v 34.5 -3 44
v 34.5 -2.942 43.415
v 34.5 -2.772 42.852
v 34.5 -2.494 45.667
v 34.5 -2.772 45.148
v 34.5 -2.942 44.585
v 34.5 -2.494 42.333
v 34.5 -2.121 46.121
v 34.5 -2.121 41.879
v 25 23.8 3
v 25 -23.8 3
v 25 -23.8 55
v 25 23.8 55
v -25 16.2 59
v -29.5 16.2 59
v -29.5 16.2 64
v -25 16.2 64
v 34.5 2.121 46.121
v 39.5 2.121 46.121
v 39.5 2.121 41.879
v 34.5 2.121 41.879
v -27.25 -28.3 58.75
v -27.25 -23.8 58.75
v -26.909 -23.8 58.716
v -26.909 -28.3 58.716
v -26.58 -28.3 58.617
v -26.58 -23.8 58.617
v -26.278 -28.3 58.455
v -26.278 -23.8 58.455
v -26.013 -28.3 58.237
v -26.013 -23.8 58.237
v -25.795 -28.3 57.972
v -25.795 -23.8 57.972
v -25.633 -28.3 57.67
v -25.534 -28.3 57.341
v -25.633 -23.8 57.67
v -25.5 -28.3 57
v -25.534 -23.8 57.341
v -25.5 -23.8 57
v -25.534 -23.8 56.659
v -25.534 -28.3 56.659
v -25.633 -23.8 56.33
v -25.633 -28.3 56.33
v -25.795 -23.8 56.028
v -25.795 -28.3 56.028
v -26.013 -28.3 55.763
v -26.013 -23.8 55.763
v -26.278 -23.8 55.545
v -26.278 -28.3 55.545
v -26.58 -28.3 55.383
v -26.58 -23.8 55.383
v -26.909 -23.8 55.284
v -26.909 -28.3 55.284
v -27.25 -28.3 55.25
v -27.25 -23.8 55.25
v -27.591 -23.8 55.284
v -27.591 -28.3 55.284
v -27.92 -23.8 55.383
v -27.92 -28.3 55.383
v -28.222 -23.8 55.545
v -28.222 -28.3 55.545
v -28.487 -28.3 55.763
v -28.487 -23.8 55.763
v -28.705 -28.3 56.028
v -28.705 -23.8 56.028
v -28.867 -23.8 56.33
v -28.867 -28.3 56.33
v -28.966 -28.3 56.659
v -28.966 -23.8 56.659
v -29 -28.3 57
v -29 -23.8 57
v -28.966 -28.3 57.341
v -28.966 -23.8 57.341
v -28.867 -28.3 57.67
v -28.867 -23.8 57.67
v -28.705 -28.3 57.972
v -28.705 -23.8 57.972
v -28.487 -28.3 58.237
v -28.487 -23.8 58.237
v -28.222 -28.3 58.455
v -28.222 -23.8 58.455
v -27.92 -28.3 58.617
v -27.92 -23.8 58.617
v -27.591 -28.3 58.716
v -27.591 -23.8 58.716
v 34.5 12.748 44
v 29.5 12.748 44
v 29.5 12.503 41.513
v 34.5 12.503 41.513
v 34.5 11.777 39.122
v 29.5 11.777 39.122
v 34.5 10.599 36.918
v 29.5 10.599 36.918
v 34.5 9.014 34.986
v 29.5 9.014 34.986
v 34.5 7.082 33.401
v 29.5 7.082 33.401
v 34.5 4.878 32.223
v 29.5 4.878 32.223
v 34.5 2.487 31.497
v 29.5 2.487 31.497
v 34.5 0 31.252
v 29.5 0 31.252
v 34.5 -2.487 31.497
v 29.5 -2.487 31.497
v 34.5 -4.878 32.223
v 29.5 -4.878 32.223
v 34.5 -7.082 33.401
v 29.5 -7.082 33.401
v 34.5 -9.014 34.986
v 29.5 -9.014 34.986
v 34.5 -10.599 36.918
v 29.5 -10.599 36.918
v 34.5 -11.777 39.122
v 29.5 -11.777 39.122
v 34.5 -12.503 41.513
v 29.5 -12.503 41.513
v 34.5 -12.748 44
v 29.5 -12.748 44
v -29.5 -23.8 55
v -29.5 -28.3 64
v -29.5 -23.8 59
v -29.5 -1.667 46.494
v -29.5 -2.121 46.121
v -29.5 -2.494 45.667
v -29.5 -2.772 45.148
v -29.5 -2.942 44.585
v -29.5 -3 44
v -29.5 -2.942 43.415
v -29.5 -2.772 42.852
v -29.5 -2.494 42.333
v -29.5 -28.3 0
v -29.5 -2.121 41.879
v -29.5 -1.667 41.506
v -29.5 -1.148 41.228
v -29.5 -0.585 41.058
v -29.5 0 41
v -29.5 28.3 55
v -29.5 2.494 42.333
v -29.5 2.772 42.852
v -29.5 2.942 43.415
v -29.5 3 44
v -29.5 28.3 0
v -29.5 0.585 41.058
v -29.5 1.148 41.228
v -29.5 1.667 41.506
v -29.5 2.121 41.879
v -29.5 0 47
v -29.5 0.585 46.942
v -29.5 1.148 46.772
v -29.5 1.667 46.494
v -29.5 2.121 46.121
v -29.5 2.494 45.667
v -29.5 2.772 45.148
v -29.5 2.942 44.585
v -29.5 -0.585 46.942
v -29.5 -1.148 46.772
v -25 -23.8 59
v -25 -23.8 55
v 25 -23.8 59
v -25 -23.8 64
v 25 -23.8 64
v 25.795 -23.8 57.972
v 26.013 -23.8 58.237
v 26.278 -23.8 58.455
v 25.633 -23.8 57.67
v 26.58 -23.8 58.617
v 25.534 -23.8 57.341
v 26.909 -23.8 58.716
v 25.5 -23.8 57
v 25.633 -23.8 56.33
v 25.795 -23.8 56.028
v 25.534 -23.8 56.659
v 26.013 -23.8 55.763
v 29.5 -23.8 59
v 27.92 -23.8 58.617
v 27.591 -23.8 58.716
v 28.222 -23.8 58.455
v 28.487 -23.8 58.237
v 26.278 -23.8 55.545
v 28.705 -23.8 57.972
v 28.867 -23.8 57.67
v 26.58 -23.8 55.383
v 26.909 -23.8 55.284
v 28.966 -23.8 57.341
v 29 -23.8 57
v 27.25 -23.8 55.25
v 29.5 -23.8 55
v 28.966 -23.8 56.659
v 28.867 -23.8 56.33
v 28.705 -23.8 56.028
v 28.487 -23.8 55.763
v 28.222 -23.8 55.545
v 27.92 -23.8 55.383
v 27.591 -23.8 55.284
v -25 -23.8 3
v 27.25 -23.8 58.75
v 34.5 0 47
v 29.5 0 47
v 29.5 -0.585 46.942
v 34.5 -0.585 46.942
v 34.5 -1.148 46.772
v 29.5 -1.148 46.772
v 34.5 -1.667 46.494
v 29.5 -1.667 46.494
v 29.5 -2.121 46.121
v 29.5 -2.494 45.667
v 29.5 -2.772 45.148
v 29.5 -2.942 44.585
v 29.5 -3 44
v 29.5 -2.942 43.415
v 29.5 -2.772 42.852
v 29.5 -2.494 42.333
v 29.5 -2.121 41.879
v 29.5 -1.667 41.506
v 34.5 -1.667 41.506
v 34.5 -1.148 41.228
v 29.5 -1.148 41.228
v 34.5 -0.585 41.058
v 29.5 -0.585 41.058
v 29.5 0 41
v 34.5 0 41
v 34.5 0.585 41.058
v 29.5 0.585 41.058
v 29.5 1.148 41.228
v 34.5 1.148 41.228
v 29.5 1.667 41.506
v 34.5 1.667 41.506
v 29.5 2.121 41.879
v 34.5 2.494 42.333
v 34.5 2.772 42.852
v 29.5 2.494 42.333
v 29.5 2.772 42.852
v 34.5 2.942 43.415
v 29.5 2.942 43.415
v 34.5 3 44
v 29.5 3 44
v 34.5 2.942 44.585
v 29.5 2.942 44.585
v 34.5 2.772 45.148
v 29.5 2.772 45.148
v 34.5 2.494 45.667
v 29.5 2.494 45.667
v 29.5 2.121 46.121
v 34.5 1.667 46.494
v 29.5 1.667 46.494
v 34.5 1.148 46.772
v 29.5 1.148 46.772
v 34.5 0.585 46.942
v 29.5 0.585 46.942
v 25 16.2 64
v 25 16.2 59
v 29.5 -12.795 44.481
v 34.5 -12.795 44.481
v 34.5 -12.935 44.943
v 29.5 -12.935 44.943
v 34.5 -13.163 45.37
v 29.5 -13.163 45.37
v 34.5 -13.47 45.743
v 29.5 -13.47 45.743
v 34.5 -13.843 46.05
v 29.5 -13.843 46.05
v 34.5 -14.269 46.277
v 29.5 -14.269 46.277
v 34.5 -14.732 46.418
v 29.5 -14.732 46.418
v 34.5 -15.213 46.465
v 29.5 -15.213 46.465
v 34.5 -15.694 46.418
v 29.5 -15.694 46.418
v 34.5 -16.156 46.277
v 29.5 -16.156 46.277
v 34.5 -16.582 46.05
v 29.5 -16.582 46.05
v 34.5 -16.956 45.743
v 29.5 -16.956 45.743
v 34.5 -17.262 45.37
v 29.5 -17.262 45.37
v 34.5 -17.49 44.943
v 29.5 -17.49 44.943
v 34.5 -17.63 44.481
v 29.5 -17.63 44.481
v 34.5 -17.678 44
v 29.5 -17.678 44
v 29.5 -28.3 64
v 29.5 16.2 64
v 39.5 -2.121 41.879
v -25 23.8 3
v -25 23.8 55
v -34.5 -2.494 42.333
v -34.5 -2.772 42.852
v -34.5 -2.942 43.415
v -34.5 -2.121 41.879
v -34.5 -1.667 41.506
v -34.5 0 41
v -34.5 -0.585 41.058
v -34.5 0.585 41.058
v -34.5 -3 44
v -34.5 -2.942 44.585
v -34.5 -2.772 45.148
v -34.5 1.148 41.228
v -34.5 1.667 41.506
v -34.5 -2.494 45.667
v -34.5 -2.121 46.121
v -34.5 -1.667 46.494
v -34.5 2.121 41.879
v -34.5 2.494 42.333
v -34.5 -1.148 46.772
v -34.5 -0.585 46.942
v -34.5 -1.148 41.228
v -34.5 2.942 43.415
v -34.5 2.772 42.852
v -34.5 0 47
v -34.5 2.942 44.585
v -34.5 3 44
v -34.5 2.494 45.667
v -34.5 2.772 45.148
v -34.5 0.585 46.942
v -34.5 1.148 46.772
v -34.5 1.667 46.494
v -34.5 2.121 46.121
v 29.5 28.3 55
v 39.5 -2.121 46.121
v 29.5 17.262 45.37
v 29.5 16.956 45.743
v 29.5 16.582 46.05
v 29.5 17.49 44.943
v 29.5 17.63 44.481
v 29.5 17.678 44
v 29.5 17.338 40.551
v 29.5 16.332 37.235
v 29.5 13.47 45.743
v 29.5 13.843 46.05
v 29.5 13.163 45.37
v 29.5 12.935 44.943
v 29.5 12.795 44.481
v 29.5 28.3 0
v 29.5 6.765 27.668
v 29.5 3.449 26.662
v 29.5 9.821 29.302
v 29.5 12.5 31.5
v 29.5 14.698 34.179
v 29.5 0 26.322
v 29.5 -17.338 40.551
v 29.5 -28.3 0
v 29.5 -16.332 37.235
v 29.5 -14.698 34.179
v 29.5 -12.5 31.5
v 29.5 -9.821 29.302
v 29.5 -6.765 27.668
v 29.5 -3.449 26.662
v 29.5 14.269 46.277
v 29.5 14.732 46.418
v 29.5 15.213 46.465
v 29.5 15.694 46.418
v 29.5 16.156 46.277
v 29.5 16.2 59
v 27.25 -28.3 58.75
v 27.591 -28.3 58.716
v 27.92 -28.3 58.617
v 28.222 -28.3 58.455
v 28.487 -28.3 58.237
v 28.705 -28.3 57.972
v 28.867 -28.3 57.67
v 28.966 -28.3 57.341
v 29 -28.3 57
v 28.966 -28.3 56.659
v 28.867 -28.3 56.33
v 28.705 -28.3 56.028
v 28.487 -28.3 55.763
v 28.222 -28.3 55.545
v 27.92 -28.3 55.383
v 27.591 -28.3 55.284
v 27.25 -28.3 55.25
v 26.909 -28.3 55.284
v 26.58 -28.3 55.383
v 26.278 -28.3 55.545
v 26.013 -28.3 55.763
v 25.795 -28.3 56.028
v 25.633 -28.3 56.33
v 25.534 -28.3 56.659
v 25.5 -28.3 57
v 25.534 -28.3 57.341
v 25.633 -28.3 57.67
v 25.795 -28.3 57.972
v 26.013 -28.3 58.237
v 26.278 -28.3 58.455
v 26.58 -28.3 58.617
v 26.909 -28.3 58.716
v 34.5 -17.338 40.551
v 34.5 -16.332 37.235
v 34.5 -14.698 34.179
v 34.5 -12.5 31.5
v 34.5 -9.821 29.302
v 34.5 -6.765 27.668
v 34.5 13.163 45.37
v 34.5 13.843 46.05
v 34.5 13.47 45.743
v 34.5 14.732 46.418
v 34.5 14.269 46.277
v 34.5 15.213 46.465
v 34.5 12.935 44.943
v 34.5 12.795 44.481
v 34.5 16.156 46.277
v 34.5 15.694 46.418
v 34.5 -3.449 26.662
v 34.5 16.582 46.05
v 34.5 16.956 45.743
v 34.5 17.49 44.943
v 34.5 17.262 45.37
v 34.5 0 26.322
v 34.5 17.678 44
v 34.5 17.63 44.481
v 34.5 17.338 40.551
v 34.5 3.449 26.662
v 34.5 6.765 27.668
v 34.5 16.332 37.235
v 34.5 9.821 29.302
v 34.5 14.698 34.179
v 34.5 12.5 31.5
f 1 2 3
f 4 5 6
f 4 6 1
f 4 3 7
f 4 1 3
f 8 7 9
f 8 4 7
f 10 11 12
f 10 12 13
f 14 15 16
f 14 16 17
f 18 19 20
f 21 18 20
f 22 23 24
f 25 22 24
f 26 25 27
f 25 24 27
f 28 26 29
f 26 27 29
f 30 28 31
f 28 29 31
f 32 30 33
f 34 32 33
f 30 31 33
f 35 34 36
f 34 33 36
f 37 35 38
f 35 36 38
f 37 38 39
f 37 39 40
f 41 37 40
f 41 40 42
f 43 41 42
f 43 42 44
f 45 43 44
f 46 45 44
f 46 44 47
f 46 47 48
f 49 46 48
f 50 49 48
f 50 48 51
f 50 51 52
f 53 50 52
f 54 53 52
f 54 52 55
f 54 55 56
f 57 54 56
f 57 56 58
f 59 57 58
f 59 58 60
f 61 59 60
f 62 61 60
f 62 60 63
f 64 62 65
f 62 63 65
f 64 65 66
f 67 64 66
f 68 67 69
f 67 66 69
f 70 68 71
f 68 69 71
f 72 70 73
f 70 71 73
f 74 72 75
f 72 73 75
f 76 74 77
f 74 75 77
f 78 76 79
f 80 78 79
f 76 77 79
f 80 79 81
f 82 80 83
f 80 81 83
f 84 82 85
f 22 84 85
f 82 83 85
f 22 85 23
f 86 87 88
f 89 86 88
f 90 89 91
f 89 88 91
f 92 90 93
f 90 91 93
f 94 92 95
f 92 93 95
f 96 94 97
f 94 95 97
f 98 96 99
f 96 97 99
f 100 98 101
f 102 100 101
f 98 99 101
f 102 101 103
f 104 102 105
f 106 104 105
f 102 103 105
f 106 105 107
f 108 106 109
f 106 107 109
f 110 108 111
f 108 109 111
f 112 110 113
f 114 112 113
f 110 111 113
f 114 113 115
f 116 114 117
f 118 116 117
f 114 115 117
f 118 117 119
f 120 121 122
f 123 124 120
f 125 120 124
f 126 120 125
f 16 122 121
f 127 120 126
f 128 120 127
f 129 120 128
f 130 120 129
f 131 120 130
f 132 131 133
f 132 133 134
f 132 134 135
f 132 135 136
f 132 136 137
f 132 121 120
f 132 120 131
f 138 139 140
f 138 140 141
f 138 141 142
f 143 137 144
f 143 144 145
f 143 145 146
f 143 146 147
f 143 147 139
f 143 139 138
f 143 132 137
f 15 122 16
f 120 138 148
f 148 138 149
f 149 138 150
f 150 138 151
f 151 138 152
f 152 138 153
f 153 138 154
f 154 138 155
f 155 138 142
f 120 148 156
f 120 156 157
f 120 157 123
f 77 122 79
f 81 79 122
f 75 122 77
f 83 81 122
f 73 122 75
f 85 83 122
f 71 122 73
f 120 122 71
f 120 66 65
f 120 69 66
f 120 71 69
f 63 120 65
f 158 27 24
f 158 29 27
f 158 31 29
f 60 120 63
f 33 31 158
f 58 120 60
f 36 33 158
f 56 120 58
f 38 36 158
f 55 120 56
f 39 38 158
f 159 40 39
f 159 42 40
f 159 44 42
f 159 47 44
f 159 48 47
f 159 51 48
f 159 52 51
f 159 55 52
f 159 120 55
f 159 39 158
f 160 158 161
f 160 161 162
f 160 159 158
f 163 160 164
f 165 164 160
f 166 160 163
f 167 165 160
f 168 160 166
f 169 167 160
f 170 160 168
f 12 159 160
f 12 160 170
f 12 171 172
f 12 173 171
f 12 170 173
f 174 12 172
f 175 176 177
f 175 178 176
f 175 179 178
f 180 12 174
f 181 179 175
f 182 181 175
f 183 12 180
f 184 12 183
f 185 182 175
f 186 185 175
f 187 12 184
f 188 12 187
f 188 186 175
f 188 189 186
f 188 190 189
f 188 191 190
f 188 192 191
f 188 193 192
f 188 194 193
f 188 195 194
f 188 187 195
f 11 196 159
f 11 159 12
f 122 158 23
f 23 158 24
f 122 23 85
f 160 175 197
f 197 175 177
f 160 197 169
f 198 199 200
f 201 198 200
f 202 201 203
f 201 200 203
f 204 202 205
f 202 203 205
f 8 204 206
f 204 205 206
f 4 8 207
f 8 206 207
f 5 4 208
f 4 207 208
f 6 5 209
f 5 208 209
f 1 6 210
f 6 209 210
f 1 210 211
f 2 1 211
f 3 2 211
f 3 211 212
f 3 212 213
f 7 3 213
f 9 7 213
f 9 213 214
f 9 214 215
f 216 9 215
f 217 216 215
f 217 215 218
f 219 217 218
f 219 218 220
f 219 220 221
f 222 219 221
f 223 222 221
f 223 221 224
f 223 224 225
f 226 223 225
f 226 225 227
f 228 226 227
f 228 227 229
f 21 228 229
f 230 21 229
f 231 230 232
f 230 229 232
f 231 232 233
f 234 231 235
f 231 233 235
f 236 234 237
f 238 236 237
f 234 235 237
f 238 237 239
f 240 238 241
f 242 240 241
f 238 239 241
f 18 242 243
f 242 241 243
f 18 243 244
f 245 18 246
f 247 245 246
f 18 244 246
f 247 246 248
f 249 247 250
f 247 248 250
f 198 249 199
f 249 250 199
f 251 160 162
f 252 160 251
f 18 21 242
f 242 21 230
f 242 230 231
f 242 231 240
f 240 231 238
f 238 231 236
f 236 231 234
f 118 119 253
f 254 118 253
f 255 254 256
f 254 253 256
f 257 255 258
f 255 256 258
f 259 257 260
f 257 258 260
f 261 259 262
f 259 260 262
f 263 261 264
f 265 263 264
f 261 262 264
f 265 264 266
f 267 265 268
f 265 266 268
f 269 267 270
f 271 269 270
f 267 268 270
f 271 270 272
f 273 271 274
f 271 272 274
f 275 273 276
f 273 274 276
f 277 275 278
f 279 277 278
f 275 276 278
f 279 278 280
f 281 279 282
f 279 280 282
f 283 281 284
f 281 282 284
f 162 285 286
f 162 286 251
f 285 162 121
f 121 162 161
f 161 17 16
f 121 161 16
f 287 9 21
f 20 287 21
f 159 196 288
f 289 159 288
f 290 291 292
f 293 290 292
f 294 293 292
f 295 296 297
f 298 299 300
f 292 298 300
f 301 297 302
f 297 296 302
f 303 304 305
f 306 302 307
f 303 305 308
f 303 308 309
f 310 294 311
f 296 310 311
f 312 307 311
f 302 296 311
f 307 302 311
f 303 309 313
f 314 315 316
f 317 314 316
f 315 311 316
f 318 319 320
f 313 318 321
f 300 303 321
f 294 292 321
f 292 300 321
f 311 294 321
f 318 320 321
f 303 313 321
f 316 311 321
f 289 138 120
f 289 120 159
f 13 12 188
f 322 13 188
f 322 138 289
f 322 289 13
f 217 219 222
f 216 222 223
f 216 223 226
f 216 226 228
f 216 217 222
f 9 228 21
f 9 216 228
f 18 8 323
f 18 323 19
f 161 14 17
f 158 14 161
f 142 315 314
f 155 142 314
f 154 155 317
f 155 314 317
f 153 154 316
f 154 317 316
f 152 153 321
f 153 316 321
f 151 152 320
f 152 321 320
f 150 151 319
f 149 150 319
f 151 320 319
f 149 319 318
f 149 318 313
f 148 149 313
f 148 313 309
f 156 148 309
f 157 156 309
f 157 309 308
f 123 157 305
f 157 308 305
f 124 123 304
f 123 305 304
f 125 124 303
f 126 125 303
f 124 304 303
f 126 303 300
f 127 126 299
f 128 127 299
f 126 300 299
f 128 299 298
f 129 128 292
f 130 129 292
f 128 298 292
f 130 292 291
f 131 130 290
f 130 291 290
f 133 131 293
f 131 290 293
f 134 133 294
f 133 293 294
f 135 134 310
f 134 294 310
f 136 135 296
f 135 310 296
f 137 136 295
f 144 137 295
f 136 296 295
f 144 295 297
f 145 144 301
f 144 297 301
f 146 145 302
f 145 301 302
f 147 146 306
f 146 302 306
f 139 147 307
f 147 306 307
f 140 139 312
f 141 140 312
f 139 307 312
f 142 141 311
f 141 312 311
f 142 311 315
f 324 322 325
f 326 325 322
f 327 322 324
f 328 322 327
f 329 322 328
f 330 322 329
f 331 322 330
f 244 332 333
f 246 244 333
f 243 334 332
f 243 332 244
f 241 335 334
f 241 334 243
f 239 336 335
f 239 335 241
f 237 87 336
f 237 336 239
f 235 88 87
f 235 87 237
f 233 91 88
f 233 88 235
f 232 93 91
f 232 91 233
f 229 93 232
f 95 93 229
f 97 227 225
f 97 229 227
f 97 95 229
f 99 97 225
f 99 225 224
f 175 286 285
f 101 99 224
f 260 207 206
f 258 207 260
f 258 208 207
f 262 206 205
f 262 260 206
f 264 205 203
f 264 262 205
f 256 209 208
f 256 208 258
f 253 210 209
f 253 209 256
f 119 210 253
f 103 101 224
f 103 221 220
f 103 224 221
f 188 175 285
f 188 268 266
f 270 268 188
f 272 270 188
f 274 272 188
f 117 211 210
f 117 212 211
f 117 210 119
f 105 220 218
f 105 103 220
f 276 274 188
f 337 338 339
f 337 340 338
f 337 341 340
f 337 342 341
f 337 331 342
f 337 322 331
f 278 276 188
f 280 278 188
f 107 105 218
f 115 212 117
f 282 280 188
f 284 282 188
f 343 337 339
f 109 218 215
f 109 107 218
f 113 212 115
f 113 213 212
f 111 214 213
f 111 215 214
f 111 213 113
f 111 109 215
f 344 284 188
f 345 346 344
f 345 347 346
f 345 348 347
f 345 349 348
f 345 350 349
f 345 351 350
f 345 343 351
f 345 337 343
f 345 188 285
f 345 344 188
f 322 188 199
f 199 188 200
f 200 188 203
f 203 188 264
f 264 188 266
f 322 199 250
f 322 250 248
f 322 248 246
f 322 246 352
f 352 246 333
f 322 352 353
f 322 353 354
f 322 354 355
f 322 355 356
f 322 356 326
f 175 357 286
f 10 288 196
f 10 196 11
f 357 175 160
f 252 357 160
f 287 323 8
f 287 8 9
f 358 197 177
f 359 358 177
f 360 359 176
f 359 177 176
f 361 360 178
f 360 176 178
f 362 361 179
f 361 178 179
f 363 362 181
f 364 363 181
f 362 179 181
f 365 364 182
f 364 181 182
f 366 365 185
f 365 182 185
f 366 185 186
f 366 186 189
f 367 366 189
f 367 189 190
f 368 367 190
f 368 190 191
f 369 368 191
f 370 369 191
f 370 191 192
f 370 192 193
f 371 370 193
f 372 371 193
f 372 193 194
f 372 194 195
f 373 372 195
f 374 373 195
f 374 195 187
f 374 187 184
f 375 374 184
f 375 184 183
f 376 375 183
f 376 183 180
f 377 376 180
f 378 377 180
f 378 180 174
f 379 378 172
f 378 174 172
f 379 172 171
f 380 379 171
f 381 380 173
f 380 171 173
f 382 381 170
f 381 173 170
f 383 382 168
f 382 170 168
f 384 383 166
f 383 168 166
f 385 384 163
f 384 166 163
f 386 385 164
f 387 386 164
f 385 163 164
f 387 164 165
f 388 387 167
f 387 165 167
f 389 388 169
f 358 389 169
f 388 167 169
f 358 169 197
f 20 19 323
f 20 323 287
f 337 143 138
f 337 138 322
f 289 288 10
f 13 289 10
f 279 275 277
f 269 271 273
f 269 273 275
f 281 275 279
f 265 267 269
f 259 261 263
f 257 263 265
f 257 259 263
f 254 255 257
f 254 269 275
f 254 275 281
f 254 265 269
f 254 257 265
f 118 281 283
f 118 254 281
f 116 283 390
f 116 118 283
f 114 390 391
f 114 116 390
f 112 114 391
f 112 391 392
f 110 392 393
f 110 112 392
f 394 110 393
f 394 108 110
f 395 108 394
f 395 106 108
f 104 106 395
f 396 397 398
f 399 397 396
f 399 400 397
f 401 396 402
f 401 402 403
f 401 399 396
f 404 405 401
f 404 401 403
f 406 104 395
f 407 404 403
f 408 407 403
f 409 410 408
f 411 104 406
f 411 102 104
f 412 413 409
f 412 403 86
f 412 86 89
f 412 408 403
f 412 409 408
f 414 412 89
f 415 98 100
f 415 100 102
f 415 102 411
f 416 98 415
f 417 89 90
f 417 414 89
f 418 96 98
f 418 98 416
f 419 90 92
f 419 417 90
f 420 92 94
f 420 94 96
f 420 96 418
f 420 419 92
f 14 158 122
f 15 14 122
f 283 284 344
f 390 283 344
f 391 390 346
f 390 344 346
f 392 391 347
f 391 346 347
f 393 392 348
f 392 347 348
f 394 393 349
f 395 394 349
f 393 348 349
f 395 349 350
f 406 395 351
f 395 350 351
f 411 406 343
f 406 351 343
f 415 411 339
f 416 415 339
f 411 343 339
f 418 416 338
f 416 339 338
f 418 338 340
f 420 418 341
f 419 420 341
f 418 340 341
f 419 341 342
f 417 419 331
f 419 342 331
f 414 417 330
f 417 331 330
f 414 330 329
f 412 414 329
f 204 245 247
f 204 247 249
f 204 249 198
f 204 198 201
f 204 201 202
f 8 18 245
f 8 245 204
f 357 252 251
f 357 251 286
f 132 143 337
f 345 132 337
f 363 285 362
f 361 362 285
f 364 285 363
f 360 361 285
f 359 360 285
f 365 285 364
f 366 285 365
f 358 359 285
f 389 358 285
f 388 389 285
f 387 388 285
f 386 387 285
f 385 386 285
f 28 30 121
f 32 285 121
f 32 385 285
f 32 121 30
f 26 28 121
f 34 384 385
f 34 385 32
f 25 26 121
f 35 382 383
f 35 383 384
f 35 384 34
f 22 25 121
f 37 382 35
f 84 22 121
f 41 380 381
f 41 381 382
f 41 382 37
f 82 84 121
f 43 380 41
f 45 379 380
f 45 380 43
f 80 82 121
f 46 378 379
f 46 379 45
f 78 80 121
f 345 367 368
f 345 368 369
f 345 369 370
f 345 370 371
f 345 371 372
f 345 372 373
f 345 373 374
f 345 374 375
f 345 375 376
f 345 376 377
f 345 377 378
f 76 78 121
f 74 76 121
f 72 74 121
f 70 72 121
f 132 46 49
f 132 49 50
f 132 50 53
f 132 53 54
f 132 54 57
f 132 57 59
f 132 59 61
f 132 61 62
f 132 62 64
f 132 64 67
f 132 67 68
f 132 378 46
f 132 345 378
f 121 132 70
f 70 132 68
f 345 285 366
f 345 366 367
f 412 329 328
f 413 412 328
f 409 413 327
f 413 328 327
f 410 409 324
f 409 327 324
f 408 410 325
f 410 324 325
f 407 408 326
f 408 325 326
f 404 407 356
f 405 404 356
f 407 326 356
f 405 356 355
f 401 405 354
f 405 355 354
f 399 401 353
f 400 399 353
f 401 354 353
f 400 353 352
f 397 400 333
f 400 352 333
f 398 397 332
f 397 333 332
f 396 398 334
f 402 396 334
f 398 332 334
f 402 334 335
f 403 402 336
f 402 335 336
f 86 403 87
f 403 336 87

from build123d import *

# Parameters (mm, degrees)
SKETCH1_W           = 59
SKETCH1_H           = 56.6
SKETCH1_W_2         = 50
SKETCH1_H_2         = 47.6
BOSS_EXTRUDE1_DEPTH = 3
BOSS_EXTRUDE2_START = 3
SKETCH1_3_W         = 59
SKETCH1_3_H         = 56.6
SKETCH1_3_W_2       = 50
SKETCH1_3_H_2       = 47.6
BOSS_EXTRUDE2_DEPTH = 52
SKETCH2_W           = 59
SKETCH2_H           = 4.5
BOSS_EXTRUDE3_DEPTH = 4
BOSS_EXTRUDE4_DEPTH = 5
SKETCH4_R           = 1.75
CUT_EXTRUDE1_DEPTH  = 88.639374713
SKETCH5_R           = 3
BOSS_EXTRUDE5_DEPTH = 5
MIRROR1_START       = -34.5
MIRROR1_OUTLINE_R   = 3
MIRROR1_DEPTH       = 5
SKETCH6_W           = 4.242640688
SKETCH6_H           = 4.242640688
BOSS_EXTRUDE6_DEPTH = 5


# Read off the part's stored shape, not the designer's step: Mirror1
with BuildPart() as part:
    # Sketch1 → Boss-Extrude1 (new body)
    # profile 1 of 2: a face of its own
    with BuildSketch(Plane.XY):
        Rectangle(SKETCH1_W, SKETCH1_H)
        Rectangle(SKETCH1_W_2, SKETCH1_H_2, mode=Mode.SUBTRACT)
    # profile 2 of 2: a face of its own
    with BuildSketch(Plane.XY):
        Rectangle(SKETCH1_W_2, SKETCH1_H_2)
    extrude(amount=BOSS_EXTRUDE1_DEPTH)

    # Sketch1<3> → Boss-Extrude2 (add)
    with BuildSketch(Plane.XY.offset(BOSS_EXTRUDE2_START)):
        Rectangle(SKETCH1_3_W, SKETCH1_3_H)
        Rectangle(SKETCH1_3_W_2, SKETCH1_3_H_2, mode=Mode.SUBTRACT)
    extrude(amount=BOSS_EXTRUDE2_DEPTH)

    # Sketch2 → Boss-Extrude3 (add)
    with BuildSketch(Plane.XY.offset(55)):
        with Locations((0, -26.05)):
            Rectangle(SKETCH2_W, SKETCH2_H)
    extrude(amount=BOSS_EXTRUDE3_DEPTH)

    # Sketch3 → Boss-Extrude4 (add)
    with BuildSketch(Plane.XY.offset(59)):
        Polygon((-29.5, -28.3), (-29.5, 16.2), (-25, 16.2), (-25, -23.8), (25, -23.8), (25, 16.2), (29.5, 16.2), (29.5, -28.3), align=None)
    extrude(amount=BOSS_EXTRUDE4_DEPTH)

    # Sketch4 → Cut-Extrude1 (cut, through all)
    with BuildSketch(Plane(origin=(0, -23.8, 0), x_dir=(1, 0, 0), z_dir=(0, 1, 0))):
        with Locations(Location((-27.25, -57, 0), (0, 0, 270))):
            Circle(SKETCH4_R)
        with Locations(Location((27.25, -57, 0), (0, 0, 270))):
            Circle(SKETCH4_R)
    extrude(amount=-CUT_EXTRUDE1_DEPTH, mode=Mode.SUBTRACT)

    # Sketch5 → Boss-Extrude5 (add)
    with BuildSketch(Plane(origin=(29.5, 0, 0), x_dir=(0, 0, -1), z_dir=(1, 0, 0))):
        with Locations(Location((-44, 0, 0), (0, 0, 180))):
            Circle(SKETCH5_R)
        with BuildLine():
            ThreePointArc((-44, -17.67766953), (-26.32233047, 0), (-44, 17.67766953))
            ThreePointArc((-44, 17.67766953), (-46.465060373, 15.212609157), (-44, 12.747548784))
            ThreePointArc((-44, 12.747548784), (-31.252451216, 0), (-44, -12.747548784))
            ThreePointArc((-44, -12.747548784), (-46.465060373, -15.212609157), (-44, -17.67766953))
        make_face()
    extrude(amount=BOSS_EXTRUDE5_DEPTH)

    # Mirror1 outline → Mirror1 (add)
    with BuildSketch(Plane.YZ.offset(MIRROR1_START)):
        with Locations((0, 44)):
            Circle(MIRROR1_OUTLINE_R)
    extrude(amount=MIRROR1_DEPTH)

    # Sketch6 → Boss-Extrude6 (add)
    with BuildSketch(Plane(origin=(34.5, 0, 0), x_dir=(0, 0, -1), z_dir=(1, 0, 0))):
        with Locations((-44, 0)):
            Rectangle(SKETCH6_W, SKETCH6_H)
    extrude(amount=BOSS_EXTRUDE6_DEPTH)


solid = part.part
